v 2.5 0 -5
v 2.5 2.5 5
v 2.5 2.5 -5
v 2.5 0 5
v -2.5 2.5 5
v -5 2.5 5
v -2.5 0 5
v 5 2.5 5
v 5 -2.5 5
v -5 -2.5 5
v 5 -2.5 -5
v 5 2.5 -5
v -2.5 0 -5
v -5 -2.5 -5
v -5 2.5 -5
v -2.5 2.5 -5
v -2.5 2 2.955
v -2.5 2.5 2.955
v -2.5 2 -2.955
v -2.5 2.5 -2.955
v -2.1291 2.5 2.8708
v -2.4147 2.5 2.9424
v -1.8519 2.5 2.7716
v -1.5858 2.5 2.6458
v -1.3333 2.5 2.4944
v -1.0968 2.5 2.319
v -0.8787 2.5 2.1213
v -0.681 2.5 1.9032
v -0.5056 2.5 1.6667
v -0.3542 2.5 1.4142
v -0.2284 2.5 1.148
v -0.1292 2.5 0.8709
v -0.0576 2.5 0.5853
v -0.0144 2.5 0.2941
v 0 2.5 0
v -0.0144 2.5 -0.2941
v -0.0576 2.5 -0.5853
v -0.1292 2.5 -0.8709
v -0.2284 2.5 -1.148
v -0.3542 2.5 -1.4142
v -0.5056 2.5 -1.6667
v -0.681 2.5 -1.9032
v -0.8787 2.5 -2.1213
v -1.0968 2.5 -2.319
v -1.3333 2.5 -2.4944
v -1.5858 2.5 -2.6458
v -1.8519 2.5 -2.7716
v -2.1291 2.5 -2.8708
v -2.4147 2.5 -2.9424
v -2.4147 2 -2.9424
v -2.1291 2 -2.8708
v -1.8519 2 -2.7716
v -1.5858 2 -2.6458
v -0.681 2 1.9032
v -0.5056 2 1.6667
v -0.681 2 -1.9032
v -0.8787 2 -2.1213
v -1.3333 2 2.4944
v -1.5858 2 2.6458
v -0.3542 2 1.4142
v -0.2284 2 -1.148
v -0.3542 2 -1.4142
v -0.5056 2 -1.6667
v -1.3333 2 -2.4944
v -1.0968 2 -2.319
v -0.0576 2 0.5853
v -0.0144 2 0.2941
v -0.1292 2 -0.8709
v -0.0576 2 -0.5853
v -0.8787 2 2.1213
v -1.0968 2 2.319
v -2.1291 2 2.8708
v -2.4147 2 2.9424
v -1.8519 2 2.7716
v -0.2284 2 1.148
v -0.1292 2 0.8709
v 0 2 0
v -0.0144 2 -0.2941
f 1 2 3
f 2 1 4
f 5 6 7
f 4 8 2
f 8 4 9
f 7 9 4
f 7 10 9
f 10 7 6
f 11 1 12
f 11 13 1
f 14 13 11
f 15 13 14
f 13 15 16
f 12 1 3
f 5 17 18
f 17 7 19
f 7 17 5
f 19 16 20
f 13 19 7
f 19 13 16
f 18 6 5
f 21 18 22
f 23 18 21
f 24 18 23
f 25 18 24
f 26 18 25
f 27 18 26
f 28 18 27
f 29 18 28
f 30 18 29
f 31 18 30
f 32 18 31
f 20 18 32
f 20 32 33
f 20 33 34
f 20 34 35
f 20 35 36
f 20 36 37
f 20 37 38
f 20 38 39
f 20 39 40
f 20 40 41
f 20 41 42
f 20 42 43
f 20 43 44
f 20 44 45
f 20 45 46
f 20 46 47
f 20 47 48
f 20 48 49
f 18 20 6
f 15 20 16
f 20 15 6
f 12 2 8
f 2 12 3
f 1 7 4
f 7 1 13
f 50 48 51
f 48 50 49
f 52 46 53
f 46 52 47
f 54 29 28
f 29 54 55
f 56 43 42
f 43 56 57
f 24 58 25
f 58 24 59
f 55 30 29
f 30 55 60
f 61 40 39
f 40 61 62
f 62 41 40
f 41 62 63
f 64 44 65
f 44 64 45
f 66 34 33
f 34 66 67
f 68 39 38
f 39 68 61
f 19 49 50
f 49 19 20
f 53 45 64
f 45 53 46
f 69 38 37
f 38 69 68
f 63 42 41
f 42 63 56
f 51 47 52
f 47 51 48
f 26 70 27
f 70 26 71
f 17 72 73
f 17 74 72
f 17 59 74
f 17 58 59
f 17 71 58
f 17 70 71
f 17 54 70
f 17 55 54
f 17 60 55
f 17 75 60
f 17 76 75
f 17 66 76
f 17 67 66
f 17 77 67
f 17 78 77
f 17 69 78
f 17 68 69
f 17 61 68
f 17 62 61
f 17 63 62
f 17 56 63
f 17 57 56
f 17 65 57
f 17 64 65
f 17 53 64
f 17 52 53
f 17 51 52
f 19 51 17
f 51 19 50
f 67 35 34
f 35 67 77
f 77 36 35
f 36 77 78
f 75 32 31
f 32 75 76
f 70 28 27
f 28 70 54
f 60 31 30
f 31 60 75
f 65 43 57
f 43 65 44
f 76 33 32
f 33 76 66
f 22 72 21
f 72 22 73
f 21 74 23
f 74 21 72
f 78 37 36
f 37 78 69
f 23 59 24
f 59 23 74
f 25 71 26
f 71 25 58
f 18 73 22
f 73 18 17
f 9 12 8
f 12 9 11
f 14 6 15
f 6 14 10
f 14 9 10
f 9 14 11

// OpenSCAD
module slot(length)
{
    $fn=64;
    difference()
    {
        translate([0,-1.25,0])cube([5,2.5,length],center=true);
        translate([-3,0,0])rotate([90,90,0])cylinder(d=6,h=1,center=true);
        if (length>40)
        {
            translate([-3,0,length/2-10])rotate([90,90,0])cylinder(d=6,h=1,center=true);
            translate([-3,0,-length/2+10])rotate([90,90,0])cylinder(d=6,h=1,center=true);
        }
            
    }
}

z=10;
x=10;
y=5;
difference()
{
    cube([x,y,z],center=true);
    translate([0,y/2,0])slot(z);
}
